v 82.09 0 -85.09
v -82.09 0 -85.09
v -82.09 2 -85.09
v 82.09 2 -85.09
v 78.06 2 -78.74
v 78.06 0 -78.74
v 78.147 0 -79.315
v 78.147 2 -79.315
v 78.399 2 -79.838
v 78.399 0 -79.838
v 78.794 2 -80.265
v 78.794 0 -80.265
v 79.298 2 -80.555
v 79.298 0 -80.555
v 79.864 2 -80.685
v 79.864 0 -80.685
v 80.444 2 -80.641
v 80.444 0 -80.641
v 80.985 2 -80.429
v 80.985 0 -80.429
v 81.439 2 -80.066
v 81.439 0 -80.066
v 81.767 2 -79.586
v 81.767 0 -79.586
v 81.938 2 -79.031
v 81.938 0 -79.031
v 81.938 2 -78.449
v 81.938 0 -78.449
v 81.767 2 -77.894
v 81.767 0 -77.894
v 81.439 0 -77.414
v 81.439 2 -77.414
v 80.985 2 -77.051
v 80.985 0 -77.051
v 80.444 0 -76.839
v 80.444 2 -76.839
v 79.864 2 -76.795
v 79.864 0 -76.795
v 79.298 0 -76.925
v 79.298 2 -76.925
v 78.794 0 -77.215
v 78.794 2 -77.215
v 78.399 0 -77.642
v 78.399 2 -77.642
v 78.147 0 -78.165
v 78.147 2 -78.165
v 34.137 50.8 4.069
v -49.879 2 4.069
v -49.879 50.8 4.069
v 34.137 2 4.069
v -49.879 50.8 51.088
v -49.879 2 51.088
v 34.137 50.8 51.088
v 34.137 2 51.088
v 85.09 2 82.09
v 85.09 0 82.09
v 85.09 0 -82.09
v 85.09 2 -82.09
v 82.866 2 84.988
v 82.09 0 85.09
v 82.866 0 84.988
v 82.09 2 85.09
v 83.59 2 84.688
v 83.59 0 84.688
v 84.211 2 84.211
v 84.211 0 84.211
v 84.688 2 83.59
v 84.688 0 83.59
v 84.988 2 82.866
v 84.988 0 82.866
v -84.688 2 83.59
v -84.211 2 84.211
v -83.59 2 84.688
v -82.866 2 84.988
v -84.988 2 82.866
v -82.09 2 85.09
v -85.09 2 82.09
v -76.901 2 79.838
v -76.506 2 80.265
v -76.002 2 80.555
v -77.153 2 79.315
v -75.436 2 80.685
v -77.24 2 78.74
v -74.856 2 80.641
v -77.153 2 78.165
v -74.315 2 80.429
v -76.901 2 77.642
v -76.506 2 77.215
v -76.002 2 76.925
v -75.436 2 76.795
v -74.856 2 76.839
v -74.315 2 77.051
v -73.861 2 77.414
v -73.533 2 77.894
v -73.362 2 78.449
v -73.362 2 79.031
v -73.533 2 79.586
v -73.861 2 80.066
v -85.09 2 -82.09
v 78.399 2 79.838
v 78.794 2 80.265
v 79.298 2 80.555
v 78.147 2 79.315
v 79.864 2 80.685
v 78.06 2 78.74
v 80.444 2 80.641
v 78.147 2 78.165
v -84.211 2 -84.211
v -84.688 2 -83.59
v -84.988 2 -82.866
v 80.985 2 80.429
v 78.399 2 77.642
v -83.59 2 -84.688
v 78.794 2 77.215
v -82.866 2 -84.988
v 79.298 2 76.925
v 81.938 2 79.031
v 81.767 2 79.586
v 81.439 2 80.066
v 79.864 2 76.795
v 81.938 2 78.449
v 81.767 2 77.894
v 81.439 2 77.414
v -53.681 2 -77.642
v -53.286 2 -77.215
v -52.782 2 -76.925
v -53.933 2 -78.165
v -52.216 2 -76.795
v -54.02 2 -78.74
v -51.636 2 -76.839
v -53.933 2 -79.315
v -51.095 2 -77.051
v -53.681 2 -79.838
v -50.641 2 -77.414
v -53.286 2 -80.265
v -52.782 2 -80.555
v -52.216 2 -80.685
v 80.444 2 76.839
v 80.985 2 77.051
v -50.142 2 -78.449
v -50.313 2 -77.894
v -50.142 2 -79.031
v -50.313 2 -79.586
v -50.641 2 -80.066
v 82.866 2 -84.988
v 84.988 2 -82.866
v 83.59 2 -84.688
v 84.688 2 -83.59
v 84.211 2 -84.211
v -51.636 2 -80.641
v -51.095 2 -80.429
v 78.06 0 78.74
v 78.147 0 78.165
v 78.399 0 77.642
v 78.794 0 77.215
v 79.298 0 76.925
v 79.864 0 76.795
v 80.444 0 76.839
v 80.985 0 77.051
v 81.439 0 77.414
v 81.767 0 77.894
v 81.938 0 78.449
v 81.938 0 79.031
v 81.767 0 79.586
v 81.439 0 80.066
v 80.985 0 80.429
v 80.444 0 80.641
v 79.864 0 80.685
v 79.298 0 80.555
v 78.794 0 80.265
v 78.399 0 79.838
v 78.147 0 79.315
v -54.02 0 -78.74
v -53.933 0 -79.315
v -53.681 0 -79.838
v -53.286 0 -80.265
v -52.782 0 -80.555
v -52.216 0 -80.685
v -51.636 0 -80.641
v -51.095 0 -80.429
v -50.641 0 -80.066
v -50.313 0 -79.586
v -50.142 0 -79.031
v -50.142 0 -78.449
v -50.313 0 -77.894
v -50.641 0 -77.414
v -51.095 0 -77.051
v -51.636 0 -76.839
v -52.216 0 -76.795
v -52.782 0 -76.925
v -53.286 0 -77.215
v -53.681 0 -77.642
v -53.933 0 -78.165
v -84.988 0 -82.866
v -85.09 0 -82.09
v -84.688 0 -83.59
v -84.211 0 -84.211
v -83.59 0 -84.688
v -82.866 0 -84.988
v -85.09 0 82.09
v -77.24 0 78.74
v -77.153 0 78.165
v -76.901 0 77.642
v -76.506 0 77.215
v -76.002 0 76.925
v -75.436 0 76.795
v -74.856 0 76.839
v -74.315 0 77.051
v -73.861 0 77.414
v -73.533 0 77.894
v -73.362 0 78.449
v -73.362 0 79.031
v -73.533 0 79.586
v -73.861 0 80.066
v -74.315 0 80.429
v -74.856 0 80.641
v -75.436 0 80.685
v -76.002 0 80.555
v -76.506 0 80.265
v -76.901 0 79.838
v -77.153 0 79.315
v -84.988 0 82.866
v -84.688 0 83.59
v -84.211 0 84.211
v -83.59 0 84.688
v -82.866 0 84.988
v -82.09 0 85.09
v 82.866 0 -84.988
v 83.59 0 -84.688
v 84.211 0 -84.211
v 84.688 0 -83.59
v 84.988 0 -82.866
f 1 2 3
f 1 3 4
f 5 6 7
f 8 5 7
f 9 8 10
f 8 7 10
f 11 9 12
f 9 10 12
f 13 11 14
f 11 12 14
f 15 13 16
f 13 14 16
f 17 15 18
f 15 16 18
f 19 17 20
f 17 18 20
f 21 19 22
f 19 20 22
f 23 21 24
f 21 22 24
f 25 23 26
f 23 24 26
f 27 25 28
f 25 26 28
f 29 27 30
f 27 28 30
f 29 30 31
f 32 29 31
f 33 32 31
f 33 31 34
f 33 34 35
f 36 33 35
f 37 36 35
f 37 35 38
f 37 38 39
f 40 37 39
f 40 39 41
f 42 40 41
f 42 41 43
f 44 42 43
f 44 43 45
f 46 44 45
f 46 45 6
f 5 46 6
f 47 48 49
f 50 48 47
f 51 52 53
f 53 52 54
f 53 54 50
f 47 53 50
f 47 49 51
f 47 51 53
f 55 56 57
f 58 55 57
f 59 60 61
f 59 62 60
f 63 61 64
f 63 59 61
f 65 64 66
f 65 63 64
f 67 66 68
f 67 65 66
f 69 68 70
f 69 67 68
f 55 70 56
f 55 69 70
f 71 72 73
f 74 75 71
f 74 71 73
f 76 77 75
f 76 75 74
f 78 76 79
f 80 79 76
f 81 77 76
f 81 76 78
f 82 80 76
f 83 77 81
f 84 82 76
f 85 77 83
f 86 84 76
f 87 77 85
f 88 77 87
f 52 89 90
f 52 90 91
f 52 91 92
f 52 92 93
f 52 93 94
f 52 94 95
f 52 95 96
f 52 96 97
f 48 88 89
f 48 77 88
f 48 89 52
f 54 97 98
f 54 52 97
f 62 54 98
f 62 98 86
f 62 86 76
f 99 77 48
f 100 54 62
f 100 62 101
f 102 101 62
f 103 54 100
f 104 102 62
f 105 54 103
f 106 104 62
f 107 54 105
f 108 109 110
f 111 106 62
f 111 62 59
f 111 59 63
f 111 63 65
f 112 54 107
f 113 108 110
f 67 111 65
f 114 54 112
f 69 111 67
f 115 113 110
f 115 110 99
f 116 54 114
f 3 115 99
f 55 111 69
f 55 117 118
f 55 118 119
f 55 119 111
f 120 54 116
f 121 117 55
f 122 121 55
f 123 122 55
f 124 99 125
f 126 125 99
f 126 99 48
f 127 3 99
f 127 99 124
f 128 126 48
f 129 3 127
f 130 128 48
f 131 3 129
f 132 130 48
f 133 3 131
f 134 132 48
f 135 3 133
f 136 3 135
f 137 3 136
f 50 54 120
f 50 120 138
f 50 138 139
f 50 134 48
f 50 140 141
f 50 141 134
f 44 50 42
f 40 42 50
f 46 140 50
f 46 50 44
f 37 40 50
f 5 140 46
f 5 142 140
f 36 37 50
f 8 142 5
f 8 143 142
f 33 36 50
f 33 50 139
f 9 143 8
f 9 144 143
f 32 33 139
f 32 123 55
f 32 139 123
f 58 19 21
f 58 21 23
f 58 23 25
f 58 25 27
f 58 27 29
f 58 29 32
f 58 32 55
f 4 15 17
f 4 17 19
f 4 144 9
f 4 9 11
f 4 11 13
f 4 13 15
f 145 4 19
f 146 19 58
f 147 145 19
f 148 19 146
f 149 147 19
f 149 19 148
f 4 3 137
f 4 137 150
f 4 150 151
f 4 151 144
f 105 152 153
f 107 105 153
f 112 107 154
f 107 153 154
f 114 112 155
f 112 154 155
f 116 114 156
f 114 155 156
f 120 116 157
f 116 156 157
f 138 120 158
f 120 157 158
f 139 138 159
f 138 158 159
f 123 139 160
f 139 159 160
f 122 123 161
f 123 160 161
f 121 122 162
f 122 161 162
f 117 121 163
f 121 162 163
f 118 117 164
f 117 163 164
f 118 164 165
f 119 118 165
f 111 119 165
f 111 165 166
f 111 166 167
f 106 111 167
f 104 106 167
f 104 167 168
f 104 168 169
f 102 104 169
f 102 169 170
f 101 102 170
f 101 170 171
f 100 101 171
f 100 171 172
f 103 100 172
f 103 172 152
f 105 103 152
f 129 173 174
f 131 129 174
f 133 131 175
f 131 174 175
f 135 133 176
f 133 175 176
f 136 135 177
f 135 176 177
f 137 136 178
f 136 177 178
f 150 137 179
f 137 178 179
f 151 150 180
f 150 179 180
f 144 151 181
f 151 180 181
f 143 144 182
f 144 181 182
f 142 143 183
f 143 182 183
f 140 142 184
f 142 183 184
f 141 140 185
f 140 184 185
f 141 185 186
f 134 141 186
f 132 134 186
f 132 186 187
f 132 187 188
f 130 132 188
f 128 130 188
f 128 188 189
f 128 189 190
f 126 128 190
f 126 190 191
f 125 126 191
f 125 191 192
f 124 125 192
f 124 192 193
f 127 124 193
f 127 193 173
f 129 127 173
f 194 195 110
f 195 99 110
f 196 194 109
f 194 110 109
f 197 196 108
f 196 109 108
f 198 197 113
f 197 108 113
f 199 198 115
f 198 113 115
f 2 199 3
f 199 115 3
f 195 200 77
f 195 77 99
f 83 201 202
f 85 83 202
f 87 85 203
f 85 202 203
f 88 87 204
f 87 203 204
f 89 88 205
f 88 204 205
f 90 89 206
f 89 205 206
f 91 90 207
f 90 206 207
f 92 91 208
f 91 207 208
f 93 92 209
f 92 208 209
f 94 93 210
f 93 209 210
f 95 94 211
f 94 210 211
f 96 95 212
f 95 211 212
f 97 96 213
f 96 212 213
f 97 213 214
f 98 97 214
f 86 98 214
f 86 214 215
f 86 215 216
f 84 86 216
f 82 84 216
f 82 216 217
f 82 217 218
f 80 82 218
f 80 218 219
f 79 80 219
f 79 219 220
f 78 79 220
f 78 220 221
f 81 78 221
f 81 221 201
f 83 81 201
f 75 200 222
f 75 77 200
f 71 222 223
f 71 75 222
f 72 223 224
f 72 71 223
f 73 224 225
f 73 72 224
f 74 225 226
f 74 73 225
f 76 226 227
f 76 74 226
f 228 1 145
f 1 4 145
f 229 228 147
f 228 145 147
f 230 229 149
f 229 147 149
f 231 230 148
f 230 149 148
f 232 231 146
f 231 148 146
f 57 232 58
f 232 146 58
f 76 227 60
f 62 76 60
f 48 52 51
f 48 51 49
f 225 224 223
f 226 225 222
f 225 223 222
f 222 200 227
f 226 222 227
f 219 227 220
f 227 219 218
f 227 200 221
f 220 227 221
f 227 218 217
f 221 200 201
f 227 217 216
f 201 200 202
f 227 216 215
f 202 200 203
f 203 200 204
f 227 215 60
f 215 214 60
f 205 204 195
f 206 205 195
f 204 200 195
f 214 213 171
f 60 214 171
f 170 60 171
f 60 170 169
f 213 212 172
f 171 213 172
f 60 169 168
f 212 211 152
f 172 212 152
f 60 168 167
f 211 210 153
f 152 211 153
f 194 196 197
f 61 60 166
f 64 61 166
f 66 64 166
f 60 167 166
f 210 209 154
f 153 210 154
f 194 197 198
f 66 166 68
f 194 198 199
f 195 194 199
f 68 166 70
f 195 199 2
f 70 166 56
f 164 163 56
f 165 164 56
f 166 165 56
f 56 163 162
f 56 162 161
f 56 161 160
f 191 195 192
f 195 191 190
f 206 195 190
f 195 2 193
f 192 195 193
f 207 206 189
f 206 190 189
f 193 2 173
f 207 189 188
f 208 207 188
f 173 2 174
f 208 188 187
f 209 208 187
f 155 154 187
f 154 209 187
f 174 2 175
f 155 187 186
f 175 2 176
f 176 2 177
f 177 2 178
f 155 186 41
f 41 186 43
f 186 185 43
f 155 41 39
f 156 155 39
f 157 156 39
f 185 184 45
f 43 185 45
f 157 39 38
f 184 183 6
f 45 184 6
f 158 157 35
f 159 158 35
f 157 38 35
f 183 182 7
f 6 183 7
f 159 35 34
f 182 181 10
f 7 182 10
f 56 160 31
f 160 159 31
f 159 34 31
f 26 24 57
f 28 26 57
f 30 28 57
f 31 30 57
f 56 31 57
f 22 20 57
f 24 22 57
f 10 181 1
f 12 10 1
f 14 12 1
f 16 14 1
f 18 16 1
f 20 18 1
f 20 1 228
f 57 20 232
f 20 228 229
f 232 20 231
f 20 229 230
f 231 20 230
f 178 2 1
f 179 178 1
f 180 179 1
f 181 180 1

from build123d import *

# Parameters (mm, degrees)
SKETCH1_W                      = 170.18
SKETCH1_H                      = 170.18
BOSS_EXTRUDE1_DEPTH            = 2
SKETCH2_W                      = 84.015738727
SKETCH2_H                      = 47.018762818
BOSS_EXTRUDE2_DEPTH            = 48.8
FILLET1_R                      = 3
F_3_9_3_9_DIAMETER_HOLE1_D     = 3.9
F_3_9_3_9_DIAMETER_HOLE1_DEPTH = 18.75
F_3_9_3_9_DIAMETER_HOLE1_TIP   = 1.171678207


with BuildPart() as part:
    # Sketch1 → Boss-Extrude1 (new body)
    with BuildSketch(Plane(origin=(0, 0, 0), x_dir=(1, 0, 0), z_dir=(0, 1, 0))):
        Rectangle(SKETCH1_W, SKETCH1_H)
    extrude(amount=BOSS_EXTRUDE1_DEPTH)

    # Sketch2 → Boss-Extrude2 (add)
    with BuildSketch(Plane(origin=(0, 2, 0), x_dir=(1, 0, 0), z_dir=(0, 1, 0))):
        with Locations((-7.871346986, -27.578797891)):
            Rectangle(SKETCH2_W, SKETCH2_H)
    extrude(amount=BOSS_EXTRUDE2_DEPTH)

    # Fillet1
    fillet1_edges = [part.edges().sort_by_distance(p)[0] for p in [
        (-85.09, 1, -85.09),
        (85.09, 1, -85.09),
        (85.09, 1, 85.09),
        (-85.09, 1, 85.09),
    ]]
    fillet(fillet1_edges, radius=FILLET1_R)

    # Ø3.9 (3.9) Diameter Hole1
    with Locations(Plane(origin=(0, 2, 0), x_dir=(1, 0, 0), z_dir=(0, 1, 0))):
        with Locations((-75.29, -78.74), (80.01, -78.74), (80.01, 78.74), (-52.07, 78.74)):
            Hole(F_3_9_3_9_DIAMETER_HOLE1_D / 2, depth=F_3_9_3_9_DIAMETER_HOLE1_DEPTH)
            with Locations((0, 0, -(F_3_9_3_9_DIAMETER_HOLE1_DEPTH + F_3_9_3_9_DIAMETER_HOLE1_TIP / 2))):  # 118° drill point
                Cone(0, F_3_9_3_9_DIAMETER_HOLE1_D / 2, F_3_9_3_9_DIAMETER_HOLE1_TIP, mode=Mode.SUBTRACT)


solid = part.part
